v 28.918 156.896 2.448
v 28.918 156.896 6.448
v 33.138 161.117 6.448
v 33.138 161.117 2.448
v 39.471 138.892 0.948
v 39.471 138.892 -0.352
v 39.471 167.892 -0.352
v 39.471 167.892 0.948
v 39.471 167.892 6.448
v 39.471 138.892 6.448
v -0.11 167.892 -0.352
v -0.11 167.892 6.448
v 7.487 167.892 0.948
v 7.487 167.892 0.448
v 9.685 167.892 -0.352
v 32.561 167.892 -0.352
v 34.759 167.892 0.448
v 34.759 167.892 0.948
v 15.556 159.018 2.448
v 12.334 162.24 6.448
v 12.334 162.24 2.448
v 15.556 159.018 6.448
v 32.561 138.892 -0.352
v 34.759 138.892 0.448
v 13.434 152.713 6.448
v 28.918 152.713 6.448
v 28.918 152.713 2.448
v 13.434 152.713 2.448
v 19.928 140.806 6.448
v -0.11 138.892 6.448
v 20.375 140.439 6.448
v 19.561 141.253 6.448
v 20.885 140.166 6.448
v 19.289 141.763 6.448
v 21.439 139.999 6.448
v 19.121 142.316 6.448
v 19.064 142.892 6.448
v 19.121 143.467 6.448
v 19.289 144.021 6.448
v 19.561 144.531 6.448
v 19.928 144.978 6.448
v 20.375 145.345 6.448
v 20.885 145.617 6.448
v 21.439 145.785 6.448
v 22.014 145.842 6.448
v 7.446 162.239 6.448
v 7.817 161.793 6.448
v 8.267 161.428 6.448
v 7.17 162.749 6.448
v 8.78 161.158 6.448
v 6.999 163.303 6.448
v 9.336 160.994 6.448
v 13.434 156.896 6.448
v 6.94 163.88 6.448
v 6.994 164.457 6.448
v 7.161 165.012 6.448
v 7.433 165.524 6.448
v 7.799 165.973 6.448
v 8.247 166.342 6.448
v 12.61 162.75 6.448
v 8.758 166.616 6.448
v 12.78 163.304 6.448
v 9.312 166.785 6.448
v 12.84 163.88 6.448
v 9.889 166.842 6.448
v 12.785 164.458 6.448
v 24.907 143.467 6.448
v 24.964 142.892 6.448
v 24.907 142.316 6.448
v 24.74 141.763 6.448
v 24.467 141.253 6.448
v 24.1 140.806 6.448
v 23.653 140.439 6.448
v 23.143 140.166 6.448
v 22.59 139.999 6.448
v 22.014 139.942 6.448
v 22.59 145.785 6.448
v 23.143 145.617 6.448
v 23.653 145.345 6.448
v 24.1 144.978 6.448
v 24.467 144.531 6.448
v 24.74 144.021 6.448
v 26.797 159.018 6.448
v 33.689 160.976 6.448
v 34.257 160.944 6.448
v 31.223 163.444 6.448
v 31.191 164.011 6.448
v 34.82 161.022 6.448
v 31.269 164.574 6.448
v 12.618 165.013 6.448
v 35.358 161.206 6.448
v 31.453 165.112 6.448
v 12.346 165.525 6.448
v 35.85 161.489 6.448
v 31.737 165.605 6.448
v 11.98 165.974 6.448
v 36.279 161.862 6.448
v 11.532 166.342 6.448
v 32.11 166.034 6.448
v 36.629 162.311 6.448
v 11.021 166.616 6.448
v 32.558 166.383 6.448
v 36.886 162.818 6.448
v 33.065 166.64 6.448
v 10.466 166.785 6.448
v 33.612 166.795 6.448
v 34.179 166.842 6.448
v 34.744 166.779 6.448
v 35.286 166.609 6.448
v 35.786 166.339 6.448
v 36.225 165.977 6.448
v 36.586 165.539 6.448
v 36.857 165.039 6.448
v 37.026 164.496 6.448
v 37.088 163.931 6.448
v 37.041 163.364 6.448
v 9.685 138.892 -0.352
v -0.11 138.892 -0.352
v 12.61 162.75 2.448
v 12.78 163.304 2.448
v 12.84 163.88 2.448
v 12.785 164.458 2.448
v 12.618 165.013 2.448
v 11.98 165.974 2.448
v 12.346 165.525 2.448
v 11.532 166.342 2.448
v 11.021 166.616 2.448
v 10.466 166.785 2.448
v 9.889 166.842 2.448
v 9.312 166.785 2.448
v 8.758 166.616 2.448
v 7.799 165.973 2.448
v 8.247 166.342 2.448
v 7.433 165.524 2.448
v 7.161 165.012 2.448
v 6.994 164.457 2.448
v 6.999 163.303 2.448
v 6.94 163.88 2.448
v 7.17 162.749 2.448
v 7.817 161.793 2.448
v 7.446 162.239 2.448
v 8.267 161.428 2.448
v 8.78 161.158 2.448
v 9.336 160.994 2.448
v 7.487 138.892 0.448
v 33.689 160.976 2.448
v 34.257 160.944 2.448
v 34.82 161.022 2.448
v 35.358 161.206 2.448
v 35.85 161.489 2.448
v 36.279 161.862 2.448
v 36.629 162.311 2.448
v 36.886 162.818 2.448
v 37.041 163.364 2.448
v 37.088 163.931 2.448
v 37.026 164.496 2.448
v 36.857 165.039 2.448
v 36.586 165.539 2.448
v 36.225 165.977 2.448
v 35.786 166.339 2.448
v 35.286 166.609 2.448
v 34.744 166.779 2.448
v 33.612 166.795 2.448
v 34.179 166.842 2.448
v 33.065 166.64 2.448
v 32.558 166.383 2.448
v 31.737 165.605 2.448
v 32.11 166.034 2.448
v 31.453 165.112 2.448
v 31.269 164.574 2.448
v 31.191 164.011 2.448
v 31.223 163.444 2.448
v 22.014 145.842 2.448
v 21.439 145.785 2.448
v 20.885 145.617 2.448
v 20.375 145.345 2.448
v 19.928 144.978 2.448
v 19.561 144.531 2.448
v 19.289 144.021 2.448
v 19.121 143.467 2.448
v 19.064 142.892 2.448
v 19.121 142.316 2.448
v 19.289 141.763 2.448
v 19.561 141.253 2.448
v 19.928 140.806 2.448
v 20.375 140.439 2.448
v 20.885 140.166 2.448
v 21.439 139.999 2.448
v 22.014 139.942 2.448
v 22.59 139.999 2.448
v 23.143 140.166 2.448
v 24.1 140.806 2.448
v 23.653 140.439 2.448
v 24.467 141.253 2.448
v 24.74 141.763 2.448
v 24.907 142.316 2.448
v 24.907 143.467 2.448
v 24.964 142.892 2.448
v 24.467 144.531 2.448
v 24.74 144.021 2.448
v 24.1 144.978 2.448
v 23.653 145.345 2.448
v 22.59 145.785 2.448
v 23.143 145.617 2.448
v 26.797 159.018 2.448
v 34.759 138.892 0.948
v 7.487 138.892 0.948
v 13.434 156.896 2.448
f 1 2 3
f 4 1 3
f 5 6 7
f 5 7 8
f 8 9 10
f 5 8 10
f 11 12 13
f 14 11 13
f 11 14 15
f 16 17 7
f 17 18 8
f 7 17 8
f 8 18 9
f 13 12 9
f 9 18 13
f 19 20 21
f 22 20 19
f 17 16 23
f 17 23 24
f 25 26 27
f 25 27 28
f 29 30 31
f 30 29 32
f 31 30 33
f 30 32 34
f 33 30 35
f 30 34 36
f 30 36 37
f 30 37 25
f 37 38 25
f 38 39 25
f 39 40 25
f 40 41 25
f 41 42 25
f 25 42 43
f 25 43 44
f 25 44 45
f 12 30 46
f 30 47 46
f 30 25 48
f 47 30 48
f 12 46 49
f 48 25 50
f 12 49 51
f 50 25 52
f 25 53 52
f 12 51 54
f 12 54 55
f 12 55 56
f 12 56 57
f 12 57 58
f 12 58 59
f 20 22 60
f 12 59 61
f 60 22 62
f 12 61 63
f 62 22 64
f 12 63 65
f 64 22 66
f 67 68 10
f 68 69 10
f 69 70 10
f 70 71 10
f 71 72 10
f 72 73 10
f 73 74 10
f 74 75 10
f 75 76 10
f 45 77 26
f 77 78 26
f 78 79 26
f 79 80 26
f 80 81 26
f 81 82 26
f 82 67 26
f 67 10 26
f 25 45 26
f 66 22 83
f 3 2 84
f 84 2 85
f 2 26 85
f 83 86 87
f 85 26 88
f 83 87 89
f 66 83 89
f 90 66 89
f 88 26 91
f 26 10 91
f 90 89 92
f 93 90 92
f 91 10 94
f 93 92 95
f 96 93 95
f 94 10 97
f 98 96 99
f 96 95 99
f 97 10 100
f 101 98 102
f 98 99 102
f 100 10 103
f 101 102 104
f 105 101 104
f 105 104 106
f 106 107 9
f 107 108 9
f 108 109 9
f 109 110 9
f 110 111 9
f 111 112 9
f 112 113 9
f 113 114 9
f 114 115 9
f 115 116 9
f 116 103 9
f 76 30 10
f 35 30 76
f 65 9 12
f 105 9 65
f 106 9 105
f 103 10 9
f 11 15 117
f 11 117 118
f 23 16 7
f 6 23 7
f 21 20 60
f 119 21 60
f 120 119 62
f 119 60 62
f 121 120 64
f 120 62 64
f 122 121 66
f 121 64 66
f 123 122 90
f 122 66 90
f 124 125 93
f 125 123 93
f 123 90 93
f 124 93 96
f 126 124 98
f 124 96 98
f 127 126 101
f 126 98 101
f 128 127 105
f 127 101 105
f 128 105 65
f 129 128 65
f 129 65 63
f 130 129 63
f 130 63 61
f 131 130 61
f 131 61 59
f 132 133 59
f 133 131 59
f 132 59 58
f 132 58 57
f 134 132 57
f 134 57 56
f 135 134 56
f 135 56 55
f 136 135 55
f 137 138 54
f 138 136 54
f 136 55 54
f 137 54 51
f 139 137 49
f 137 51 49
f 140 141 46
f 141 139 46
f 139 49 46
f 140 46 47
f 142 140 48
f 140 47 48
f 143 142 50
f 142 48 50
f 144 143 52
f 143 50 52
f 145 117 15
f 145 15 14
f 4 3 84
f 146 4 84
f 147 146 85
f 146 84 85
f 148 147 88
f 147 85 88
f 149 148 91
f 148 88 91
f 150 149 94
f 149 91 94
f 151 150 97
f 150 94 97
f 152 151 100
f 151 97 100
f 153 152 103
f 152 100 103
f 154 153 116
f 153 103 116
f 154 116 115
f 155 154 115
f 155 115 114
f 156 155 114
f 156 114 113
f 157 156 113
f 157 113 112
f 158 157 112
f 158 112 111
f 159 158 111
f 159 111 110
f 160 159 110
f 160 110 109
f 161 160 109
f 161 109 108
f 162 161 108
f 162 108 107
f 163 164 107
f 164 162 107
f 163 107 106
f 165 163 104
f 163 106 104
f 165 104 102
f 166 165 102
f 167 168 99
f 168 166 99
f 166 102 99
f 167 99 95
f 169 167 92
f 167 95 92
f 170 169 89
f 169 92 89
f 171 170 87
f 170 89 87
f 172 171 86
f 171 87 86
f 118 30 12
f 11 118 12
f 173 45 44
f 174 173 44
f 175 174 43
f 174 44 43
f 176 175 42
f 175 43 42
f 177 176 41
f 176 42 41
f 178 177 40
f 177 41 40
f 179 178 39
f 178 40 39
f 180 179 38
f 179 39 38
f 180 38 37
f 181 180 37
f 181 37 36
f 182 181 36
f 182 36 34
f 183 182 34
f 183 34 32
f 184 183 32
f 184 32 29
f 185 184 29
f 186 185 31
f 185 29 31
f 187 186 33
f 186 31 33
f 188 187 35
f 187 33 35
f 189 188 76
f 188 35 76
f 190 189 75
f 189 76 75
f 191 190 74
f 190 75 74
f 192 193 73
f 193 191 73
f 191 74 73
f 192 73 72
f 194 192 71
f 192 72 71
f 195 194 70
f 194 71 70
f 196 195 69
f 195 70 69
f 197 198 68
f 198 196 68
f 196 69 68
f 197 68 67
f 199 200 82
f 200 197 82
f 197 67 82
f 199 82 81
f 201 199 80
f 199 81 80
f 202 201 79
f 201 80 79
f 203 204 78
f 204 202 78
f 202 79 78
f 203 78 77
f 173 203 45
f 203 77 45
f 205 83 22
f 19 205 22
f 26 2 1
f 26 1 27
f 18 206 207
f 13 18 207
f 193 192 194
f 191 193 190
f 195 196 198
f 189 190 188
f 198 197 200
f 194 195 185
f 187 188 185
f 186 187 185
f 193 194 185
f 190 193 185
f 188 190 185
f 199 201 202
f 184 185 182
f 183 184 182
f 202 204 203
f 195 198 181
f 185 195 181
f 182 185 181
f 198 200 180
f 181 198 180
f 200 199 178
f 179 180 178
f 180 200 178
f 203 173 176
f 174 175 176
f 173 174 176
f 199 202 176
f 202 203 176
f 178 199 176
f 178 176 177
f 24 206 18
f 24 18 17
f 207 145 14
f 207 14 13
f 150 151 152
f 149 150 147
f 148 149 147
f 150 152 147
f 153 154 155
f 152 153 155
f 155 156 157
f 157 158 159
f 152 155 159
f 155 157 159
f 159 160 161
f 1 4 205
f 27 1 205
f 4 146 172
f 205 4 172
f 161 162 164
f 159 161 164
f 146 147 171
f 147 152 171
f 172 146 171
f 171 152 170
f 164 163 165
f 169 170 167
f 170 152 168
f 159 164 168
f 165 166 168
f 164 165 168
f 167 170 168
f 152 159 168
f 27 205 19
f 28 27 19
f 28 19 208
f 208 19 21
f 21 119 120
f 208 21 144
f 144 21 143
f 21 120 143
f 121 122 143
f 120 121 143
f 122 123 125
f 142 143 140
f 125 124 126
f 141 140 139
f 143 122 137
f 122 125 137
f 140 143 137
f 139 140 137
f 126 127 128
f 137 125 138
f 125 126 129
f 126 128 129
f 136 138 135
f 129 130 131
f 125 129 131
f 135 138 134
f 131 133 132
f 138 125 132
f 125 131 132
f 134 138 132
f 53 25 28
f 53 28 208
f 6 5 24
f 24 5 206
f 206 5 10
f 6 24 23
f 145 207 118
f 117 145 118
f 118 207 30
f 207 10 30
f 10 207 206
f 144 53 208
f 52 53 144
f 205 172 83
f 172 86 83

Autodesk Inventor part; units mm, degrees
ref_plane "YZ Plane" through (0, 0, 0) normal (1, 0, 0) x (0, 1, 0)
ref_plane "XZ Plane" through (0, 0, 0) normal (0, 1, 0) x (-1, 0, 0)
ref_plane "XY Plane" through (0, 0, 0) normal (0, 0, 1) x (1, 0, 0)
ref_plane "Work Plane1" through (52.5141, 202.7033, 6.4479) normal (0, 0, -1) x (0, 1, 0)
sketch "Sketch1" plane through (52.5141, 202.7033, 6.4479) normal (0, 0, -1) x (0, 1, 0)
  circle A0 centre (-59.8114, -30.5) radius 1.4 construction
  circle A1 centre (-38.8114, -18.3756) radius 1.4 projected
  circle A2 centre (-38.8114, -42.6244) radius 1.4 construction
  circle A3 centre (41, 0) radius 1.65 projected
  circle A4 centre (-9, 0) radius 1.65 projected
  circle A5 centre (-9, 50) radius 1.65 projected
  circle A6 centre (41, 50) radius 1.65 projected
  circle A7 centre (16, 50) radius 1.65 projected
  circle A8 centre (-9, 25) radius 1.65 projected
  circle A9 centre (16, 0) radius 1.65 projected
  circle A10 centre (41, 25) radius 1.65 projected
  line L0 (80, 55) -> (-80, 55) projected
  line L1 (-80, 55) -> (-80, -55) projected
  line L2 (-80, -55) -> (80, -55) projected
  line L3 (80, -55) -> (80, 55) projected
  line L4 (-36.5, 0) -> (-36.5, -50) projected
  line L5 (-14, 0) -> (-36.5, 0) projected
  line L6 (-14, -5) -> (-14, 0) projected
  line L7 (72, -5) -> (-14, -5) projected
  line L8 (72, -50) -> (72, -5) projected
  line L9 (-36.5, -50) -> (72, -50) projected
  line L10 (-4, 45) -> (-4, 5) projected
  line L11 (36, 45) -> (-4, 45) projected
  line L12 (36, 5) -> (36, 45) projected
  line L13 (-4, 5) -> (36, 5) projected
  line L14 (-64.5989, -17.0433) -> (-64.5989, -57.0433) construction
  line L15 (-64.5989, -57.0433) -> (-34.5989, -57.0433) construction
  line L16 (-34.5989, -57.0433) -> (-34.5989, -17.0433) construction
  line L17 (-34.5989, -17.0433) -> (-64.5989, -17.0433) construction
  line L18 (-34.8114, -13.0433) -> (-63.8114, -13.0433)
  line L19 (-63.8114, -13.0433) -> (-63.8114, -52.6244)
  line L20 (-63.8114, -52.6244) -> (-34.8114, -52.6244)
  line L21 (-34.8114, -52.6244) -> (-34.8114, -13.0433)
  circle A11 centre (-59.8114, -30.5) radius 2.95
  circle A12 centre (-38.8114, -18.3756) radius 2.95
  circle A13 centre (-38.8114, -42.6244) radius 2.95 construction
  line L22 (-36.5, -35.1157) -> (-41.75, -35.1157) construction
  line L23 (-41.75, -35.1157) -> (-41.75, -38.5657) construction
  line L24 (-41.75, -38.5657) -> (-56.86, -38.5657) construction
  line L25 (-56.86, -38.5657) -> (-56.86, -35.1157) construction
  line L26 (-56.86, -35.1157) -> (-60.26, -35.1157) construction
  line L27 (-60.26, -35.1157) -> (-60.26, -52.0657) construction
  line L28 (-60.26, -52.0657) -> (-36.5, -52.0657) construction
  line L29 (-36.5, -52.0657) -> (-36.5, -35.1157) construction
  line L30 (-41.75, -28.3657) -> (-36.5, -28.3657) construction
  line L31 (-36.5, -28.3657) -> (-36.5, -25.0657) construction
  line L32 (-36.5, -25.0657) -> (-60.26, -25.0657) construction
  line L33 (-60.26, -25.0657) -> (-60.26, -28.3657) construction
  line L34 (-60.26, -28.3657) -> (-56.86, -28.3657) construction
  line L35 (-56.86, -28.3657) -> (-56.86, -27.0942) construction
  line L36 (-56.86, -27.0942) -> (-41.75, -27.0942) construction
  line L37 (-41.75, -27.0942) -> (-41.75, -28.3657) construction
  line L38 (-56.86, -35.1157) -> (-60.26, -35.1157) construction
  line L39 (-56.86, -38.5657) -> (-56.86, -35.1157) construction
  line L40 (-41.75, -38.5657) -> (-56.86, -38.5657) construction
  line L41 (-41.75, -35.1157) -> (-41.75, -38.5657) construction
  line L42 (-36.5, -35.1157) -> (-41.75, -35.1157) construction
  line L43 (-36.5, -35.05) -> (-36.5, -35.1157) construction
  line L44 (-36.5, -35.05) -> (-56.86, -35.05) construction
  line L45 (-36.5, -34.78) -> (-36.5, -35.05) construction
  line L46 (-36.5, -34.78) -> (-56.86, -34.78) construction
  line L47 (-36.5, -34.51) -> (-36.5, -34.78) construction
  line L48 (-36.5, -34.51) -> (-56.86, -34.51) construction
  line L49 (-36.5, -34.24) -> (-36.5, -34.51) construction
  line L50 (-36.5, -34.24) -> (-56.86, -34.24) construction
  line L51 (-36.5, -33.97) -> (-36.5, -34.24) construction
  line L52 (-36.5, -33.97) -> (-56.86, -33.97) construction
  line L53 (-36.5, -33.7) -> (-36.5, -33.97) construction
  line L54 (-36.5, -33.7) -> (-56.86, -33.7) construction
  line L55 (-36.5, -33.43) -> (-36.5, -33.7) construction
  line L56 (-36.5, -33.43) -> (-56.86, -33.43) construction
  line L57 (-36.5, -33.16) -> (-36.5, -33.43) construction
  line L58 (-36.5, -33.16) -> (-56.86, -33.16) construction
  line L59 (-36.5, -32.89) -> (-36.5, -33.16) construction
  line L60 (-36.5, -32.89) -> (-56.86, -32.89) construction
  line L61 (-36.5, -32.62) -> (-36.5, -32.89) construction
  line L62 (-36.5, -32.62) -> (-56.86, -32.62) construction
  line L63 (-36.5, -32.35) -> (-36.5, -32.62) construction
  line L64 (-36.5, -32.35) -> (-56.86, -32.35) construction
  line L65 (-36.5, -32.08) -> (-36.5, -32.35) construction
  line L66 (-36.5, -32.08) -> (-56.86, -32.08) construction
  line L67 (-36.5, -31.81) -> (-36.5, -32.08) construction
  line L68 (-36.5, -31.81) -> (-56.86, -31.81) construction
  line L69 (-36.5, -31.54) -> (-36.5, -31.81) construction
  line L70 (-36.5, -31.54) -> (-56.86, -31.54) construction
  line L71 (-36.5, -31.27) -> (-36.5, -31.54) construction
  line L72 (-36.5, -31.27) -> (-56.86, -31.27) construction
  line L73 (-36.5, -31) -> (-36.5, -31.27) construction
  line L74 (-36.5, -31) -> (-56.86, -31) construction
  line L75 (-36.5, -30.73) -> (-36.5, -31) construction
  line L76 (-36.5, -30.73) -> (-56.86, -30.73) construction
  line L77 (-36.5, -30.46) -> (-36.5, -30.73) construction
  line L78 (-36.5, -30.46) -> (-56.86, -30.46) construction
  line L79 (-36.5, -30.19) -> (-36.5, -30.46) construction
  line L80 (-36.5, -30.19) -> (-56.86, -30.19) construction
  line L81 (-36.5, -29.92) -> (-36.5, -30.19) construction
  line L82 (-36.5, -29.92) -> (-56.86, -29.92) construction
  line L83 (-36.5, -29.65) -> (-36.5, -29.92) construction
  line L84 (-36.5, -29.65) -> (-56.86, -29.65) construction
  line L85 (-36.5, -29.38) -> (-36.5, -29.65) construction
  line L86 (-36.5, -29.38) -> (-56.86, -29.38) construction
  line L87 (-36.5, -29.11) -> (-36.5, -29.38) construction
  line L88 (-36.5, -29.11) -> (-56.86, -29.11) construction
  line L89 (-36.5, -28.84) -> (-36.5, -29.11) construction
  line L90 (-36.5, -28.84) -> (-56.86, -28.84) construction
  line L91 (-36.5, -28.3657) -> (-36.5, -28.84) construction
  line L92 (-41.75, -28.3657) -> (-36.5, -28.3657) construction
  line L93 (-41.75, -27.0942) -> (-41.75, -28.3657) construction
  line L94 (-56.86, -27.0942) -> (-41.75, -27.0942) construction
  line L95 (-56.86, -28.3657) -> (-56.86, -27.0942) construction
  line L96 (-60.26, -28.3657) -> (-56.86, -28.3657) construction
  line L97 (-60.26, -35.1157) -> (-60.26, -28.3657) construction
  line L98 (-60.26, -25.0657) -> (-36.5, -25.0657) construction
  line L99 (-36.5, -25.0657) -> (-36.5, -52.0657) construction
  line L100 (-60.26, -52.0657) -> (-60.26, -25.0657) construction
  line L101 (-57.1632, -22.5233) -> (-33.4032, -22.5233) construction
  line L102 (-33.4032, -22.5233) -> (-33.4032, -49.5233) construction
  line L103 (-33.4032, -49.5233) -> (-57.1632, -49.5233) construction
  line L104 (-57.1632, -49.5233) -> (-57.1632, -22.5233) construction
  circle A14 centre (-38.8114, -42.6244) radius 2.95
  point P0 (-202.7033, -52.5141)
  point P1 (-56.7146, -27.9576)
  dimension "d0" = 4
  dimension "d2" = 4
  dimension "d3" = 4
  dimension "d4" = 5.9
  dimension "d5" = 5.9
  dimension "d6" = 5.9
  dimension "d10" = 10
extrude "Extrusion1" add sketch "Sketch1" along normal blind 4 contours L18 L21 L9 L4 A14 A12 | L4 A12 A14 L9 L21 L20 L19 L18
sketch "Sketch2" plane through (52.5141, 202.7033, 2.4479) normal (0, 0, -1) x (-1, 0, 0)
  circle A0 centre (42.6244, -38.8114) radius 2.95 projected
  circle A1 centre (18.3756, -38.8114) radius 2.95 projected
  circle A2 centre (30.5, -59.8114) radius 2.95 projected
  line L0 (13.0433, -34.8114) -> (13.0433, -63.8114) projected
  line L1 (13.0433, -63.8114) -> (52.6244, -63.8114) projected
  line L2 (52.6244, -63.8114) -> (52.6244, -34.8114) projected
  line L3 (52.6244, -34.8114) -> (13.0433, -34.8114) projected
  point P0 (52.5141, -202.7033)
extrude "Extrusion2" add sketch "Sketch2" along normal blind 1.5 contours A0 | A1 | A2 | L3 L2 L1 L0
sketch "Sketch3" plane through (-0.1103, 138.8919, 6.4479) normal (0, -1, 0) x (1, 0, 0)
  line L0 (39.581, 0) -> (0, 0) projected
  line L1 (0, 0) -> (0, -5.5) projected
  line L2 (39.581, -5.5) -> (0, -5.5) projected
  line L3 (39.581, 0) -> (39.581, -5.5) projected
  line L4 (17.5087, -7.4479) -> (17.5087, -6.8479) construction
  line L5 (17.5087, -6.8479) -> (24.2587, -6.8479) construction
  line L6 (24.2587, -6.8479) -> (24.2587, -7.4479) construction
  line L7 (27.5587, -7.4479) -> (24.2587, -7.4479) construction
  line L8 (27.5587, -6.4479) -> (27.5587, -7.4479) construction
  line L9 (27.5587, -6.4479) -> (0.5587, -6.4479) construction
  line L10 (0.5587, -6.4479) -> (0.5587, -7.4479) construction
  line L11 (17.5087, -7.4479) -> (0.5587, -7.4479) construction
  line L12 (39.581, 0) -> (39.581, -5.5) projected
  line L13 (39.581, -5.5) -> (34.8694, -5.5)
  line L14 (34.8694, -5.5) -> (34.8694, -6)
  line L15 (34.8694, -6.8) -> (39.581, -6.8)
  line L16 (39.581, -6.8) -> (39.581, -5.5)
  line L17 (39.581, -6.8) -> (32.6714, -6.8)
  line L18 (32.6714, -6.8) -> (34.8694, -6)
  line L19 (12.6726, -5.5) -> (12.6726, -6.5) projected
  line L20 (0, 0) -> (0, -5.5) projected
  line L21 (0, -5.5) -> (8.1109, -5.5)
  line L22 (8.1109, -6.8) -> (0, -6.8)
  line L23 (0, -6.8) -> (0, -5.5)
  line L24 (9.7957, -6.8) -> (8.1109, -6.8)
  line L25 (0, -5.5) -> (39.581, -5.5) projected
  line L26 (9.7957, -6.8) -> (7.5977, -6)
  line L27 (7.5977, -6) -> (7.5977, -5.5)
  line L28 (8.8957, -5.5) -> (33.4957, -5.5) construction
  line L29 (33.4957, -5.5) -> (33.4957, -6.5) construction
  line L30 (33.4957, -6.5) -> (8.8957, -6.5) construction
  line L31 (8.8957, -6.5) -> (8.8957, -5.5) construction
  point P0 (8.981, -5.5)
  dimension "d42" = 1.3
  dimension "d43" = 110
  dimension "d45" = 0.5
  dimension "d46" = 0.5
  dimension "d47" = 110
  dimension "d48" = 24.6
  dimension "d49" = 1
  dimension "d50" = 0.9
  dimension "d51" = 0
extrude "Extrusion3" add sketch "Sketch3" against normal up to surface (29 mm away) contours L16 L15 L17 L18 L14 L2 | L2 L27 L26 L24 L22 L23
sketch "Sketch6" plane through (52.5141, 202.7033, 6.4479) normal (0, 0, 1) x (1, 0, 0)
  line L0 (-13.0433, -34.8114) -> (-13.0433, -63.8114) projected
  line L1 (-52.6244, -34.8114) -> (-13.0433, -34.8114) projected
  line L2 (-52.6244, -63.8114) -> (-52.6244, -34.8114) projected
  line L3 (-13.0433, -63.8114) -> (-52.6244, -63.8114) projected
  line L4 (-23.5962, -45.8071) -> (-17.5454, -39.7563)
  line L5 (-17.5454, -39.7563) -> (-19.6668, -37.635)
  line L6 (-19.6668, -37.635) -> (-25.7175, -43.6858)
  line L7 (-25.7175, -43.6858) -> (-23.5962, -45.8071)
  line L8 (-23.5962, -45.8071) -> (-19.6668, -37.635) construction
  line L9 (-17.5454, -39.7563) -> (-25.7175, -43.6858) construction
  line L10 (-39.0797, -45.8071) -> (-43.9064, -40.9803)
  line L11 (-43.9064, -40.9803) -> (-41.7851, -38.859)
  line L12 (-41.7851, -38.859) -> (-36.9583, -43.6858)
  line L13 (-36.9583, -43.6858) -> (-39.0797, -45.8071)
  line L14 (-39.0797, -45.8071) -> (-41.7851, -38.859) construction
  line L15 (-43.9064, -40.9803) -> (-36.9583, -43.6858) construction
  line L16 (-25.7175, -43.6858) -> (-36.9583, -43.6858)
  line L17 (-23.5962, -45.8071) -> (-23.5962, -49.9899)
  line L18 (-23.5962, -49.9899) -> (-39.0797, -49.9899)
  line L19 (-39.0797, -49.9899) -> (-39.0797, -45.8071)
  point P0 (-52.5141, -202.7033)
  point P1 (-21.6315, -41.7211)
  point P2 (-40.4324, -42.333)
  dimension "d35" = 3
  dimension "d36" = 3
  dimension "d37" = 45
  dimension "d38" = 0
extrude "Extrusion6" cut sketch "Sketch6" against normal up to surface (4 mm away) contours L7 L6 L5 L4 | L17 L18 L19 L13 L16 L7 | L13 L10 L11 L12
properties part number "cellSTORM_v5_chiptray_new_0_22.4"
